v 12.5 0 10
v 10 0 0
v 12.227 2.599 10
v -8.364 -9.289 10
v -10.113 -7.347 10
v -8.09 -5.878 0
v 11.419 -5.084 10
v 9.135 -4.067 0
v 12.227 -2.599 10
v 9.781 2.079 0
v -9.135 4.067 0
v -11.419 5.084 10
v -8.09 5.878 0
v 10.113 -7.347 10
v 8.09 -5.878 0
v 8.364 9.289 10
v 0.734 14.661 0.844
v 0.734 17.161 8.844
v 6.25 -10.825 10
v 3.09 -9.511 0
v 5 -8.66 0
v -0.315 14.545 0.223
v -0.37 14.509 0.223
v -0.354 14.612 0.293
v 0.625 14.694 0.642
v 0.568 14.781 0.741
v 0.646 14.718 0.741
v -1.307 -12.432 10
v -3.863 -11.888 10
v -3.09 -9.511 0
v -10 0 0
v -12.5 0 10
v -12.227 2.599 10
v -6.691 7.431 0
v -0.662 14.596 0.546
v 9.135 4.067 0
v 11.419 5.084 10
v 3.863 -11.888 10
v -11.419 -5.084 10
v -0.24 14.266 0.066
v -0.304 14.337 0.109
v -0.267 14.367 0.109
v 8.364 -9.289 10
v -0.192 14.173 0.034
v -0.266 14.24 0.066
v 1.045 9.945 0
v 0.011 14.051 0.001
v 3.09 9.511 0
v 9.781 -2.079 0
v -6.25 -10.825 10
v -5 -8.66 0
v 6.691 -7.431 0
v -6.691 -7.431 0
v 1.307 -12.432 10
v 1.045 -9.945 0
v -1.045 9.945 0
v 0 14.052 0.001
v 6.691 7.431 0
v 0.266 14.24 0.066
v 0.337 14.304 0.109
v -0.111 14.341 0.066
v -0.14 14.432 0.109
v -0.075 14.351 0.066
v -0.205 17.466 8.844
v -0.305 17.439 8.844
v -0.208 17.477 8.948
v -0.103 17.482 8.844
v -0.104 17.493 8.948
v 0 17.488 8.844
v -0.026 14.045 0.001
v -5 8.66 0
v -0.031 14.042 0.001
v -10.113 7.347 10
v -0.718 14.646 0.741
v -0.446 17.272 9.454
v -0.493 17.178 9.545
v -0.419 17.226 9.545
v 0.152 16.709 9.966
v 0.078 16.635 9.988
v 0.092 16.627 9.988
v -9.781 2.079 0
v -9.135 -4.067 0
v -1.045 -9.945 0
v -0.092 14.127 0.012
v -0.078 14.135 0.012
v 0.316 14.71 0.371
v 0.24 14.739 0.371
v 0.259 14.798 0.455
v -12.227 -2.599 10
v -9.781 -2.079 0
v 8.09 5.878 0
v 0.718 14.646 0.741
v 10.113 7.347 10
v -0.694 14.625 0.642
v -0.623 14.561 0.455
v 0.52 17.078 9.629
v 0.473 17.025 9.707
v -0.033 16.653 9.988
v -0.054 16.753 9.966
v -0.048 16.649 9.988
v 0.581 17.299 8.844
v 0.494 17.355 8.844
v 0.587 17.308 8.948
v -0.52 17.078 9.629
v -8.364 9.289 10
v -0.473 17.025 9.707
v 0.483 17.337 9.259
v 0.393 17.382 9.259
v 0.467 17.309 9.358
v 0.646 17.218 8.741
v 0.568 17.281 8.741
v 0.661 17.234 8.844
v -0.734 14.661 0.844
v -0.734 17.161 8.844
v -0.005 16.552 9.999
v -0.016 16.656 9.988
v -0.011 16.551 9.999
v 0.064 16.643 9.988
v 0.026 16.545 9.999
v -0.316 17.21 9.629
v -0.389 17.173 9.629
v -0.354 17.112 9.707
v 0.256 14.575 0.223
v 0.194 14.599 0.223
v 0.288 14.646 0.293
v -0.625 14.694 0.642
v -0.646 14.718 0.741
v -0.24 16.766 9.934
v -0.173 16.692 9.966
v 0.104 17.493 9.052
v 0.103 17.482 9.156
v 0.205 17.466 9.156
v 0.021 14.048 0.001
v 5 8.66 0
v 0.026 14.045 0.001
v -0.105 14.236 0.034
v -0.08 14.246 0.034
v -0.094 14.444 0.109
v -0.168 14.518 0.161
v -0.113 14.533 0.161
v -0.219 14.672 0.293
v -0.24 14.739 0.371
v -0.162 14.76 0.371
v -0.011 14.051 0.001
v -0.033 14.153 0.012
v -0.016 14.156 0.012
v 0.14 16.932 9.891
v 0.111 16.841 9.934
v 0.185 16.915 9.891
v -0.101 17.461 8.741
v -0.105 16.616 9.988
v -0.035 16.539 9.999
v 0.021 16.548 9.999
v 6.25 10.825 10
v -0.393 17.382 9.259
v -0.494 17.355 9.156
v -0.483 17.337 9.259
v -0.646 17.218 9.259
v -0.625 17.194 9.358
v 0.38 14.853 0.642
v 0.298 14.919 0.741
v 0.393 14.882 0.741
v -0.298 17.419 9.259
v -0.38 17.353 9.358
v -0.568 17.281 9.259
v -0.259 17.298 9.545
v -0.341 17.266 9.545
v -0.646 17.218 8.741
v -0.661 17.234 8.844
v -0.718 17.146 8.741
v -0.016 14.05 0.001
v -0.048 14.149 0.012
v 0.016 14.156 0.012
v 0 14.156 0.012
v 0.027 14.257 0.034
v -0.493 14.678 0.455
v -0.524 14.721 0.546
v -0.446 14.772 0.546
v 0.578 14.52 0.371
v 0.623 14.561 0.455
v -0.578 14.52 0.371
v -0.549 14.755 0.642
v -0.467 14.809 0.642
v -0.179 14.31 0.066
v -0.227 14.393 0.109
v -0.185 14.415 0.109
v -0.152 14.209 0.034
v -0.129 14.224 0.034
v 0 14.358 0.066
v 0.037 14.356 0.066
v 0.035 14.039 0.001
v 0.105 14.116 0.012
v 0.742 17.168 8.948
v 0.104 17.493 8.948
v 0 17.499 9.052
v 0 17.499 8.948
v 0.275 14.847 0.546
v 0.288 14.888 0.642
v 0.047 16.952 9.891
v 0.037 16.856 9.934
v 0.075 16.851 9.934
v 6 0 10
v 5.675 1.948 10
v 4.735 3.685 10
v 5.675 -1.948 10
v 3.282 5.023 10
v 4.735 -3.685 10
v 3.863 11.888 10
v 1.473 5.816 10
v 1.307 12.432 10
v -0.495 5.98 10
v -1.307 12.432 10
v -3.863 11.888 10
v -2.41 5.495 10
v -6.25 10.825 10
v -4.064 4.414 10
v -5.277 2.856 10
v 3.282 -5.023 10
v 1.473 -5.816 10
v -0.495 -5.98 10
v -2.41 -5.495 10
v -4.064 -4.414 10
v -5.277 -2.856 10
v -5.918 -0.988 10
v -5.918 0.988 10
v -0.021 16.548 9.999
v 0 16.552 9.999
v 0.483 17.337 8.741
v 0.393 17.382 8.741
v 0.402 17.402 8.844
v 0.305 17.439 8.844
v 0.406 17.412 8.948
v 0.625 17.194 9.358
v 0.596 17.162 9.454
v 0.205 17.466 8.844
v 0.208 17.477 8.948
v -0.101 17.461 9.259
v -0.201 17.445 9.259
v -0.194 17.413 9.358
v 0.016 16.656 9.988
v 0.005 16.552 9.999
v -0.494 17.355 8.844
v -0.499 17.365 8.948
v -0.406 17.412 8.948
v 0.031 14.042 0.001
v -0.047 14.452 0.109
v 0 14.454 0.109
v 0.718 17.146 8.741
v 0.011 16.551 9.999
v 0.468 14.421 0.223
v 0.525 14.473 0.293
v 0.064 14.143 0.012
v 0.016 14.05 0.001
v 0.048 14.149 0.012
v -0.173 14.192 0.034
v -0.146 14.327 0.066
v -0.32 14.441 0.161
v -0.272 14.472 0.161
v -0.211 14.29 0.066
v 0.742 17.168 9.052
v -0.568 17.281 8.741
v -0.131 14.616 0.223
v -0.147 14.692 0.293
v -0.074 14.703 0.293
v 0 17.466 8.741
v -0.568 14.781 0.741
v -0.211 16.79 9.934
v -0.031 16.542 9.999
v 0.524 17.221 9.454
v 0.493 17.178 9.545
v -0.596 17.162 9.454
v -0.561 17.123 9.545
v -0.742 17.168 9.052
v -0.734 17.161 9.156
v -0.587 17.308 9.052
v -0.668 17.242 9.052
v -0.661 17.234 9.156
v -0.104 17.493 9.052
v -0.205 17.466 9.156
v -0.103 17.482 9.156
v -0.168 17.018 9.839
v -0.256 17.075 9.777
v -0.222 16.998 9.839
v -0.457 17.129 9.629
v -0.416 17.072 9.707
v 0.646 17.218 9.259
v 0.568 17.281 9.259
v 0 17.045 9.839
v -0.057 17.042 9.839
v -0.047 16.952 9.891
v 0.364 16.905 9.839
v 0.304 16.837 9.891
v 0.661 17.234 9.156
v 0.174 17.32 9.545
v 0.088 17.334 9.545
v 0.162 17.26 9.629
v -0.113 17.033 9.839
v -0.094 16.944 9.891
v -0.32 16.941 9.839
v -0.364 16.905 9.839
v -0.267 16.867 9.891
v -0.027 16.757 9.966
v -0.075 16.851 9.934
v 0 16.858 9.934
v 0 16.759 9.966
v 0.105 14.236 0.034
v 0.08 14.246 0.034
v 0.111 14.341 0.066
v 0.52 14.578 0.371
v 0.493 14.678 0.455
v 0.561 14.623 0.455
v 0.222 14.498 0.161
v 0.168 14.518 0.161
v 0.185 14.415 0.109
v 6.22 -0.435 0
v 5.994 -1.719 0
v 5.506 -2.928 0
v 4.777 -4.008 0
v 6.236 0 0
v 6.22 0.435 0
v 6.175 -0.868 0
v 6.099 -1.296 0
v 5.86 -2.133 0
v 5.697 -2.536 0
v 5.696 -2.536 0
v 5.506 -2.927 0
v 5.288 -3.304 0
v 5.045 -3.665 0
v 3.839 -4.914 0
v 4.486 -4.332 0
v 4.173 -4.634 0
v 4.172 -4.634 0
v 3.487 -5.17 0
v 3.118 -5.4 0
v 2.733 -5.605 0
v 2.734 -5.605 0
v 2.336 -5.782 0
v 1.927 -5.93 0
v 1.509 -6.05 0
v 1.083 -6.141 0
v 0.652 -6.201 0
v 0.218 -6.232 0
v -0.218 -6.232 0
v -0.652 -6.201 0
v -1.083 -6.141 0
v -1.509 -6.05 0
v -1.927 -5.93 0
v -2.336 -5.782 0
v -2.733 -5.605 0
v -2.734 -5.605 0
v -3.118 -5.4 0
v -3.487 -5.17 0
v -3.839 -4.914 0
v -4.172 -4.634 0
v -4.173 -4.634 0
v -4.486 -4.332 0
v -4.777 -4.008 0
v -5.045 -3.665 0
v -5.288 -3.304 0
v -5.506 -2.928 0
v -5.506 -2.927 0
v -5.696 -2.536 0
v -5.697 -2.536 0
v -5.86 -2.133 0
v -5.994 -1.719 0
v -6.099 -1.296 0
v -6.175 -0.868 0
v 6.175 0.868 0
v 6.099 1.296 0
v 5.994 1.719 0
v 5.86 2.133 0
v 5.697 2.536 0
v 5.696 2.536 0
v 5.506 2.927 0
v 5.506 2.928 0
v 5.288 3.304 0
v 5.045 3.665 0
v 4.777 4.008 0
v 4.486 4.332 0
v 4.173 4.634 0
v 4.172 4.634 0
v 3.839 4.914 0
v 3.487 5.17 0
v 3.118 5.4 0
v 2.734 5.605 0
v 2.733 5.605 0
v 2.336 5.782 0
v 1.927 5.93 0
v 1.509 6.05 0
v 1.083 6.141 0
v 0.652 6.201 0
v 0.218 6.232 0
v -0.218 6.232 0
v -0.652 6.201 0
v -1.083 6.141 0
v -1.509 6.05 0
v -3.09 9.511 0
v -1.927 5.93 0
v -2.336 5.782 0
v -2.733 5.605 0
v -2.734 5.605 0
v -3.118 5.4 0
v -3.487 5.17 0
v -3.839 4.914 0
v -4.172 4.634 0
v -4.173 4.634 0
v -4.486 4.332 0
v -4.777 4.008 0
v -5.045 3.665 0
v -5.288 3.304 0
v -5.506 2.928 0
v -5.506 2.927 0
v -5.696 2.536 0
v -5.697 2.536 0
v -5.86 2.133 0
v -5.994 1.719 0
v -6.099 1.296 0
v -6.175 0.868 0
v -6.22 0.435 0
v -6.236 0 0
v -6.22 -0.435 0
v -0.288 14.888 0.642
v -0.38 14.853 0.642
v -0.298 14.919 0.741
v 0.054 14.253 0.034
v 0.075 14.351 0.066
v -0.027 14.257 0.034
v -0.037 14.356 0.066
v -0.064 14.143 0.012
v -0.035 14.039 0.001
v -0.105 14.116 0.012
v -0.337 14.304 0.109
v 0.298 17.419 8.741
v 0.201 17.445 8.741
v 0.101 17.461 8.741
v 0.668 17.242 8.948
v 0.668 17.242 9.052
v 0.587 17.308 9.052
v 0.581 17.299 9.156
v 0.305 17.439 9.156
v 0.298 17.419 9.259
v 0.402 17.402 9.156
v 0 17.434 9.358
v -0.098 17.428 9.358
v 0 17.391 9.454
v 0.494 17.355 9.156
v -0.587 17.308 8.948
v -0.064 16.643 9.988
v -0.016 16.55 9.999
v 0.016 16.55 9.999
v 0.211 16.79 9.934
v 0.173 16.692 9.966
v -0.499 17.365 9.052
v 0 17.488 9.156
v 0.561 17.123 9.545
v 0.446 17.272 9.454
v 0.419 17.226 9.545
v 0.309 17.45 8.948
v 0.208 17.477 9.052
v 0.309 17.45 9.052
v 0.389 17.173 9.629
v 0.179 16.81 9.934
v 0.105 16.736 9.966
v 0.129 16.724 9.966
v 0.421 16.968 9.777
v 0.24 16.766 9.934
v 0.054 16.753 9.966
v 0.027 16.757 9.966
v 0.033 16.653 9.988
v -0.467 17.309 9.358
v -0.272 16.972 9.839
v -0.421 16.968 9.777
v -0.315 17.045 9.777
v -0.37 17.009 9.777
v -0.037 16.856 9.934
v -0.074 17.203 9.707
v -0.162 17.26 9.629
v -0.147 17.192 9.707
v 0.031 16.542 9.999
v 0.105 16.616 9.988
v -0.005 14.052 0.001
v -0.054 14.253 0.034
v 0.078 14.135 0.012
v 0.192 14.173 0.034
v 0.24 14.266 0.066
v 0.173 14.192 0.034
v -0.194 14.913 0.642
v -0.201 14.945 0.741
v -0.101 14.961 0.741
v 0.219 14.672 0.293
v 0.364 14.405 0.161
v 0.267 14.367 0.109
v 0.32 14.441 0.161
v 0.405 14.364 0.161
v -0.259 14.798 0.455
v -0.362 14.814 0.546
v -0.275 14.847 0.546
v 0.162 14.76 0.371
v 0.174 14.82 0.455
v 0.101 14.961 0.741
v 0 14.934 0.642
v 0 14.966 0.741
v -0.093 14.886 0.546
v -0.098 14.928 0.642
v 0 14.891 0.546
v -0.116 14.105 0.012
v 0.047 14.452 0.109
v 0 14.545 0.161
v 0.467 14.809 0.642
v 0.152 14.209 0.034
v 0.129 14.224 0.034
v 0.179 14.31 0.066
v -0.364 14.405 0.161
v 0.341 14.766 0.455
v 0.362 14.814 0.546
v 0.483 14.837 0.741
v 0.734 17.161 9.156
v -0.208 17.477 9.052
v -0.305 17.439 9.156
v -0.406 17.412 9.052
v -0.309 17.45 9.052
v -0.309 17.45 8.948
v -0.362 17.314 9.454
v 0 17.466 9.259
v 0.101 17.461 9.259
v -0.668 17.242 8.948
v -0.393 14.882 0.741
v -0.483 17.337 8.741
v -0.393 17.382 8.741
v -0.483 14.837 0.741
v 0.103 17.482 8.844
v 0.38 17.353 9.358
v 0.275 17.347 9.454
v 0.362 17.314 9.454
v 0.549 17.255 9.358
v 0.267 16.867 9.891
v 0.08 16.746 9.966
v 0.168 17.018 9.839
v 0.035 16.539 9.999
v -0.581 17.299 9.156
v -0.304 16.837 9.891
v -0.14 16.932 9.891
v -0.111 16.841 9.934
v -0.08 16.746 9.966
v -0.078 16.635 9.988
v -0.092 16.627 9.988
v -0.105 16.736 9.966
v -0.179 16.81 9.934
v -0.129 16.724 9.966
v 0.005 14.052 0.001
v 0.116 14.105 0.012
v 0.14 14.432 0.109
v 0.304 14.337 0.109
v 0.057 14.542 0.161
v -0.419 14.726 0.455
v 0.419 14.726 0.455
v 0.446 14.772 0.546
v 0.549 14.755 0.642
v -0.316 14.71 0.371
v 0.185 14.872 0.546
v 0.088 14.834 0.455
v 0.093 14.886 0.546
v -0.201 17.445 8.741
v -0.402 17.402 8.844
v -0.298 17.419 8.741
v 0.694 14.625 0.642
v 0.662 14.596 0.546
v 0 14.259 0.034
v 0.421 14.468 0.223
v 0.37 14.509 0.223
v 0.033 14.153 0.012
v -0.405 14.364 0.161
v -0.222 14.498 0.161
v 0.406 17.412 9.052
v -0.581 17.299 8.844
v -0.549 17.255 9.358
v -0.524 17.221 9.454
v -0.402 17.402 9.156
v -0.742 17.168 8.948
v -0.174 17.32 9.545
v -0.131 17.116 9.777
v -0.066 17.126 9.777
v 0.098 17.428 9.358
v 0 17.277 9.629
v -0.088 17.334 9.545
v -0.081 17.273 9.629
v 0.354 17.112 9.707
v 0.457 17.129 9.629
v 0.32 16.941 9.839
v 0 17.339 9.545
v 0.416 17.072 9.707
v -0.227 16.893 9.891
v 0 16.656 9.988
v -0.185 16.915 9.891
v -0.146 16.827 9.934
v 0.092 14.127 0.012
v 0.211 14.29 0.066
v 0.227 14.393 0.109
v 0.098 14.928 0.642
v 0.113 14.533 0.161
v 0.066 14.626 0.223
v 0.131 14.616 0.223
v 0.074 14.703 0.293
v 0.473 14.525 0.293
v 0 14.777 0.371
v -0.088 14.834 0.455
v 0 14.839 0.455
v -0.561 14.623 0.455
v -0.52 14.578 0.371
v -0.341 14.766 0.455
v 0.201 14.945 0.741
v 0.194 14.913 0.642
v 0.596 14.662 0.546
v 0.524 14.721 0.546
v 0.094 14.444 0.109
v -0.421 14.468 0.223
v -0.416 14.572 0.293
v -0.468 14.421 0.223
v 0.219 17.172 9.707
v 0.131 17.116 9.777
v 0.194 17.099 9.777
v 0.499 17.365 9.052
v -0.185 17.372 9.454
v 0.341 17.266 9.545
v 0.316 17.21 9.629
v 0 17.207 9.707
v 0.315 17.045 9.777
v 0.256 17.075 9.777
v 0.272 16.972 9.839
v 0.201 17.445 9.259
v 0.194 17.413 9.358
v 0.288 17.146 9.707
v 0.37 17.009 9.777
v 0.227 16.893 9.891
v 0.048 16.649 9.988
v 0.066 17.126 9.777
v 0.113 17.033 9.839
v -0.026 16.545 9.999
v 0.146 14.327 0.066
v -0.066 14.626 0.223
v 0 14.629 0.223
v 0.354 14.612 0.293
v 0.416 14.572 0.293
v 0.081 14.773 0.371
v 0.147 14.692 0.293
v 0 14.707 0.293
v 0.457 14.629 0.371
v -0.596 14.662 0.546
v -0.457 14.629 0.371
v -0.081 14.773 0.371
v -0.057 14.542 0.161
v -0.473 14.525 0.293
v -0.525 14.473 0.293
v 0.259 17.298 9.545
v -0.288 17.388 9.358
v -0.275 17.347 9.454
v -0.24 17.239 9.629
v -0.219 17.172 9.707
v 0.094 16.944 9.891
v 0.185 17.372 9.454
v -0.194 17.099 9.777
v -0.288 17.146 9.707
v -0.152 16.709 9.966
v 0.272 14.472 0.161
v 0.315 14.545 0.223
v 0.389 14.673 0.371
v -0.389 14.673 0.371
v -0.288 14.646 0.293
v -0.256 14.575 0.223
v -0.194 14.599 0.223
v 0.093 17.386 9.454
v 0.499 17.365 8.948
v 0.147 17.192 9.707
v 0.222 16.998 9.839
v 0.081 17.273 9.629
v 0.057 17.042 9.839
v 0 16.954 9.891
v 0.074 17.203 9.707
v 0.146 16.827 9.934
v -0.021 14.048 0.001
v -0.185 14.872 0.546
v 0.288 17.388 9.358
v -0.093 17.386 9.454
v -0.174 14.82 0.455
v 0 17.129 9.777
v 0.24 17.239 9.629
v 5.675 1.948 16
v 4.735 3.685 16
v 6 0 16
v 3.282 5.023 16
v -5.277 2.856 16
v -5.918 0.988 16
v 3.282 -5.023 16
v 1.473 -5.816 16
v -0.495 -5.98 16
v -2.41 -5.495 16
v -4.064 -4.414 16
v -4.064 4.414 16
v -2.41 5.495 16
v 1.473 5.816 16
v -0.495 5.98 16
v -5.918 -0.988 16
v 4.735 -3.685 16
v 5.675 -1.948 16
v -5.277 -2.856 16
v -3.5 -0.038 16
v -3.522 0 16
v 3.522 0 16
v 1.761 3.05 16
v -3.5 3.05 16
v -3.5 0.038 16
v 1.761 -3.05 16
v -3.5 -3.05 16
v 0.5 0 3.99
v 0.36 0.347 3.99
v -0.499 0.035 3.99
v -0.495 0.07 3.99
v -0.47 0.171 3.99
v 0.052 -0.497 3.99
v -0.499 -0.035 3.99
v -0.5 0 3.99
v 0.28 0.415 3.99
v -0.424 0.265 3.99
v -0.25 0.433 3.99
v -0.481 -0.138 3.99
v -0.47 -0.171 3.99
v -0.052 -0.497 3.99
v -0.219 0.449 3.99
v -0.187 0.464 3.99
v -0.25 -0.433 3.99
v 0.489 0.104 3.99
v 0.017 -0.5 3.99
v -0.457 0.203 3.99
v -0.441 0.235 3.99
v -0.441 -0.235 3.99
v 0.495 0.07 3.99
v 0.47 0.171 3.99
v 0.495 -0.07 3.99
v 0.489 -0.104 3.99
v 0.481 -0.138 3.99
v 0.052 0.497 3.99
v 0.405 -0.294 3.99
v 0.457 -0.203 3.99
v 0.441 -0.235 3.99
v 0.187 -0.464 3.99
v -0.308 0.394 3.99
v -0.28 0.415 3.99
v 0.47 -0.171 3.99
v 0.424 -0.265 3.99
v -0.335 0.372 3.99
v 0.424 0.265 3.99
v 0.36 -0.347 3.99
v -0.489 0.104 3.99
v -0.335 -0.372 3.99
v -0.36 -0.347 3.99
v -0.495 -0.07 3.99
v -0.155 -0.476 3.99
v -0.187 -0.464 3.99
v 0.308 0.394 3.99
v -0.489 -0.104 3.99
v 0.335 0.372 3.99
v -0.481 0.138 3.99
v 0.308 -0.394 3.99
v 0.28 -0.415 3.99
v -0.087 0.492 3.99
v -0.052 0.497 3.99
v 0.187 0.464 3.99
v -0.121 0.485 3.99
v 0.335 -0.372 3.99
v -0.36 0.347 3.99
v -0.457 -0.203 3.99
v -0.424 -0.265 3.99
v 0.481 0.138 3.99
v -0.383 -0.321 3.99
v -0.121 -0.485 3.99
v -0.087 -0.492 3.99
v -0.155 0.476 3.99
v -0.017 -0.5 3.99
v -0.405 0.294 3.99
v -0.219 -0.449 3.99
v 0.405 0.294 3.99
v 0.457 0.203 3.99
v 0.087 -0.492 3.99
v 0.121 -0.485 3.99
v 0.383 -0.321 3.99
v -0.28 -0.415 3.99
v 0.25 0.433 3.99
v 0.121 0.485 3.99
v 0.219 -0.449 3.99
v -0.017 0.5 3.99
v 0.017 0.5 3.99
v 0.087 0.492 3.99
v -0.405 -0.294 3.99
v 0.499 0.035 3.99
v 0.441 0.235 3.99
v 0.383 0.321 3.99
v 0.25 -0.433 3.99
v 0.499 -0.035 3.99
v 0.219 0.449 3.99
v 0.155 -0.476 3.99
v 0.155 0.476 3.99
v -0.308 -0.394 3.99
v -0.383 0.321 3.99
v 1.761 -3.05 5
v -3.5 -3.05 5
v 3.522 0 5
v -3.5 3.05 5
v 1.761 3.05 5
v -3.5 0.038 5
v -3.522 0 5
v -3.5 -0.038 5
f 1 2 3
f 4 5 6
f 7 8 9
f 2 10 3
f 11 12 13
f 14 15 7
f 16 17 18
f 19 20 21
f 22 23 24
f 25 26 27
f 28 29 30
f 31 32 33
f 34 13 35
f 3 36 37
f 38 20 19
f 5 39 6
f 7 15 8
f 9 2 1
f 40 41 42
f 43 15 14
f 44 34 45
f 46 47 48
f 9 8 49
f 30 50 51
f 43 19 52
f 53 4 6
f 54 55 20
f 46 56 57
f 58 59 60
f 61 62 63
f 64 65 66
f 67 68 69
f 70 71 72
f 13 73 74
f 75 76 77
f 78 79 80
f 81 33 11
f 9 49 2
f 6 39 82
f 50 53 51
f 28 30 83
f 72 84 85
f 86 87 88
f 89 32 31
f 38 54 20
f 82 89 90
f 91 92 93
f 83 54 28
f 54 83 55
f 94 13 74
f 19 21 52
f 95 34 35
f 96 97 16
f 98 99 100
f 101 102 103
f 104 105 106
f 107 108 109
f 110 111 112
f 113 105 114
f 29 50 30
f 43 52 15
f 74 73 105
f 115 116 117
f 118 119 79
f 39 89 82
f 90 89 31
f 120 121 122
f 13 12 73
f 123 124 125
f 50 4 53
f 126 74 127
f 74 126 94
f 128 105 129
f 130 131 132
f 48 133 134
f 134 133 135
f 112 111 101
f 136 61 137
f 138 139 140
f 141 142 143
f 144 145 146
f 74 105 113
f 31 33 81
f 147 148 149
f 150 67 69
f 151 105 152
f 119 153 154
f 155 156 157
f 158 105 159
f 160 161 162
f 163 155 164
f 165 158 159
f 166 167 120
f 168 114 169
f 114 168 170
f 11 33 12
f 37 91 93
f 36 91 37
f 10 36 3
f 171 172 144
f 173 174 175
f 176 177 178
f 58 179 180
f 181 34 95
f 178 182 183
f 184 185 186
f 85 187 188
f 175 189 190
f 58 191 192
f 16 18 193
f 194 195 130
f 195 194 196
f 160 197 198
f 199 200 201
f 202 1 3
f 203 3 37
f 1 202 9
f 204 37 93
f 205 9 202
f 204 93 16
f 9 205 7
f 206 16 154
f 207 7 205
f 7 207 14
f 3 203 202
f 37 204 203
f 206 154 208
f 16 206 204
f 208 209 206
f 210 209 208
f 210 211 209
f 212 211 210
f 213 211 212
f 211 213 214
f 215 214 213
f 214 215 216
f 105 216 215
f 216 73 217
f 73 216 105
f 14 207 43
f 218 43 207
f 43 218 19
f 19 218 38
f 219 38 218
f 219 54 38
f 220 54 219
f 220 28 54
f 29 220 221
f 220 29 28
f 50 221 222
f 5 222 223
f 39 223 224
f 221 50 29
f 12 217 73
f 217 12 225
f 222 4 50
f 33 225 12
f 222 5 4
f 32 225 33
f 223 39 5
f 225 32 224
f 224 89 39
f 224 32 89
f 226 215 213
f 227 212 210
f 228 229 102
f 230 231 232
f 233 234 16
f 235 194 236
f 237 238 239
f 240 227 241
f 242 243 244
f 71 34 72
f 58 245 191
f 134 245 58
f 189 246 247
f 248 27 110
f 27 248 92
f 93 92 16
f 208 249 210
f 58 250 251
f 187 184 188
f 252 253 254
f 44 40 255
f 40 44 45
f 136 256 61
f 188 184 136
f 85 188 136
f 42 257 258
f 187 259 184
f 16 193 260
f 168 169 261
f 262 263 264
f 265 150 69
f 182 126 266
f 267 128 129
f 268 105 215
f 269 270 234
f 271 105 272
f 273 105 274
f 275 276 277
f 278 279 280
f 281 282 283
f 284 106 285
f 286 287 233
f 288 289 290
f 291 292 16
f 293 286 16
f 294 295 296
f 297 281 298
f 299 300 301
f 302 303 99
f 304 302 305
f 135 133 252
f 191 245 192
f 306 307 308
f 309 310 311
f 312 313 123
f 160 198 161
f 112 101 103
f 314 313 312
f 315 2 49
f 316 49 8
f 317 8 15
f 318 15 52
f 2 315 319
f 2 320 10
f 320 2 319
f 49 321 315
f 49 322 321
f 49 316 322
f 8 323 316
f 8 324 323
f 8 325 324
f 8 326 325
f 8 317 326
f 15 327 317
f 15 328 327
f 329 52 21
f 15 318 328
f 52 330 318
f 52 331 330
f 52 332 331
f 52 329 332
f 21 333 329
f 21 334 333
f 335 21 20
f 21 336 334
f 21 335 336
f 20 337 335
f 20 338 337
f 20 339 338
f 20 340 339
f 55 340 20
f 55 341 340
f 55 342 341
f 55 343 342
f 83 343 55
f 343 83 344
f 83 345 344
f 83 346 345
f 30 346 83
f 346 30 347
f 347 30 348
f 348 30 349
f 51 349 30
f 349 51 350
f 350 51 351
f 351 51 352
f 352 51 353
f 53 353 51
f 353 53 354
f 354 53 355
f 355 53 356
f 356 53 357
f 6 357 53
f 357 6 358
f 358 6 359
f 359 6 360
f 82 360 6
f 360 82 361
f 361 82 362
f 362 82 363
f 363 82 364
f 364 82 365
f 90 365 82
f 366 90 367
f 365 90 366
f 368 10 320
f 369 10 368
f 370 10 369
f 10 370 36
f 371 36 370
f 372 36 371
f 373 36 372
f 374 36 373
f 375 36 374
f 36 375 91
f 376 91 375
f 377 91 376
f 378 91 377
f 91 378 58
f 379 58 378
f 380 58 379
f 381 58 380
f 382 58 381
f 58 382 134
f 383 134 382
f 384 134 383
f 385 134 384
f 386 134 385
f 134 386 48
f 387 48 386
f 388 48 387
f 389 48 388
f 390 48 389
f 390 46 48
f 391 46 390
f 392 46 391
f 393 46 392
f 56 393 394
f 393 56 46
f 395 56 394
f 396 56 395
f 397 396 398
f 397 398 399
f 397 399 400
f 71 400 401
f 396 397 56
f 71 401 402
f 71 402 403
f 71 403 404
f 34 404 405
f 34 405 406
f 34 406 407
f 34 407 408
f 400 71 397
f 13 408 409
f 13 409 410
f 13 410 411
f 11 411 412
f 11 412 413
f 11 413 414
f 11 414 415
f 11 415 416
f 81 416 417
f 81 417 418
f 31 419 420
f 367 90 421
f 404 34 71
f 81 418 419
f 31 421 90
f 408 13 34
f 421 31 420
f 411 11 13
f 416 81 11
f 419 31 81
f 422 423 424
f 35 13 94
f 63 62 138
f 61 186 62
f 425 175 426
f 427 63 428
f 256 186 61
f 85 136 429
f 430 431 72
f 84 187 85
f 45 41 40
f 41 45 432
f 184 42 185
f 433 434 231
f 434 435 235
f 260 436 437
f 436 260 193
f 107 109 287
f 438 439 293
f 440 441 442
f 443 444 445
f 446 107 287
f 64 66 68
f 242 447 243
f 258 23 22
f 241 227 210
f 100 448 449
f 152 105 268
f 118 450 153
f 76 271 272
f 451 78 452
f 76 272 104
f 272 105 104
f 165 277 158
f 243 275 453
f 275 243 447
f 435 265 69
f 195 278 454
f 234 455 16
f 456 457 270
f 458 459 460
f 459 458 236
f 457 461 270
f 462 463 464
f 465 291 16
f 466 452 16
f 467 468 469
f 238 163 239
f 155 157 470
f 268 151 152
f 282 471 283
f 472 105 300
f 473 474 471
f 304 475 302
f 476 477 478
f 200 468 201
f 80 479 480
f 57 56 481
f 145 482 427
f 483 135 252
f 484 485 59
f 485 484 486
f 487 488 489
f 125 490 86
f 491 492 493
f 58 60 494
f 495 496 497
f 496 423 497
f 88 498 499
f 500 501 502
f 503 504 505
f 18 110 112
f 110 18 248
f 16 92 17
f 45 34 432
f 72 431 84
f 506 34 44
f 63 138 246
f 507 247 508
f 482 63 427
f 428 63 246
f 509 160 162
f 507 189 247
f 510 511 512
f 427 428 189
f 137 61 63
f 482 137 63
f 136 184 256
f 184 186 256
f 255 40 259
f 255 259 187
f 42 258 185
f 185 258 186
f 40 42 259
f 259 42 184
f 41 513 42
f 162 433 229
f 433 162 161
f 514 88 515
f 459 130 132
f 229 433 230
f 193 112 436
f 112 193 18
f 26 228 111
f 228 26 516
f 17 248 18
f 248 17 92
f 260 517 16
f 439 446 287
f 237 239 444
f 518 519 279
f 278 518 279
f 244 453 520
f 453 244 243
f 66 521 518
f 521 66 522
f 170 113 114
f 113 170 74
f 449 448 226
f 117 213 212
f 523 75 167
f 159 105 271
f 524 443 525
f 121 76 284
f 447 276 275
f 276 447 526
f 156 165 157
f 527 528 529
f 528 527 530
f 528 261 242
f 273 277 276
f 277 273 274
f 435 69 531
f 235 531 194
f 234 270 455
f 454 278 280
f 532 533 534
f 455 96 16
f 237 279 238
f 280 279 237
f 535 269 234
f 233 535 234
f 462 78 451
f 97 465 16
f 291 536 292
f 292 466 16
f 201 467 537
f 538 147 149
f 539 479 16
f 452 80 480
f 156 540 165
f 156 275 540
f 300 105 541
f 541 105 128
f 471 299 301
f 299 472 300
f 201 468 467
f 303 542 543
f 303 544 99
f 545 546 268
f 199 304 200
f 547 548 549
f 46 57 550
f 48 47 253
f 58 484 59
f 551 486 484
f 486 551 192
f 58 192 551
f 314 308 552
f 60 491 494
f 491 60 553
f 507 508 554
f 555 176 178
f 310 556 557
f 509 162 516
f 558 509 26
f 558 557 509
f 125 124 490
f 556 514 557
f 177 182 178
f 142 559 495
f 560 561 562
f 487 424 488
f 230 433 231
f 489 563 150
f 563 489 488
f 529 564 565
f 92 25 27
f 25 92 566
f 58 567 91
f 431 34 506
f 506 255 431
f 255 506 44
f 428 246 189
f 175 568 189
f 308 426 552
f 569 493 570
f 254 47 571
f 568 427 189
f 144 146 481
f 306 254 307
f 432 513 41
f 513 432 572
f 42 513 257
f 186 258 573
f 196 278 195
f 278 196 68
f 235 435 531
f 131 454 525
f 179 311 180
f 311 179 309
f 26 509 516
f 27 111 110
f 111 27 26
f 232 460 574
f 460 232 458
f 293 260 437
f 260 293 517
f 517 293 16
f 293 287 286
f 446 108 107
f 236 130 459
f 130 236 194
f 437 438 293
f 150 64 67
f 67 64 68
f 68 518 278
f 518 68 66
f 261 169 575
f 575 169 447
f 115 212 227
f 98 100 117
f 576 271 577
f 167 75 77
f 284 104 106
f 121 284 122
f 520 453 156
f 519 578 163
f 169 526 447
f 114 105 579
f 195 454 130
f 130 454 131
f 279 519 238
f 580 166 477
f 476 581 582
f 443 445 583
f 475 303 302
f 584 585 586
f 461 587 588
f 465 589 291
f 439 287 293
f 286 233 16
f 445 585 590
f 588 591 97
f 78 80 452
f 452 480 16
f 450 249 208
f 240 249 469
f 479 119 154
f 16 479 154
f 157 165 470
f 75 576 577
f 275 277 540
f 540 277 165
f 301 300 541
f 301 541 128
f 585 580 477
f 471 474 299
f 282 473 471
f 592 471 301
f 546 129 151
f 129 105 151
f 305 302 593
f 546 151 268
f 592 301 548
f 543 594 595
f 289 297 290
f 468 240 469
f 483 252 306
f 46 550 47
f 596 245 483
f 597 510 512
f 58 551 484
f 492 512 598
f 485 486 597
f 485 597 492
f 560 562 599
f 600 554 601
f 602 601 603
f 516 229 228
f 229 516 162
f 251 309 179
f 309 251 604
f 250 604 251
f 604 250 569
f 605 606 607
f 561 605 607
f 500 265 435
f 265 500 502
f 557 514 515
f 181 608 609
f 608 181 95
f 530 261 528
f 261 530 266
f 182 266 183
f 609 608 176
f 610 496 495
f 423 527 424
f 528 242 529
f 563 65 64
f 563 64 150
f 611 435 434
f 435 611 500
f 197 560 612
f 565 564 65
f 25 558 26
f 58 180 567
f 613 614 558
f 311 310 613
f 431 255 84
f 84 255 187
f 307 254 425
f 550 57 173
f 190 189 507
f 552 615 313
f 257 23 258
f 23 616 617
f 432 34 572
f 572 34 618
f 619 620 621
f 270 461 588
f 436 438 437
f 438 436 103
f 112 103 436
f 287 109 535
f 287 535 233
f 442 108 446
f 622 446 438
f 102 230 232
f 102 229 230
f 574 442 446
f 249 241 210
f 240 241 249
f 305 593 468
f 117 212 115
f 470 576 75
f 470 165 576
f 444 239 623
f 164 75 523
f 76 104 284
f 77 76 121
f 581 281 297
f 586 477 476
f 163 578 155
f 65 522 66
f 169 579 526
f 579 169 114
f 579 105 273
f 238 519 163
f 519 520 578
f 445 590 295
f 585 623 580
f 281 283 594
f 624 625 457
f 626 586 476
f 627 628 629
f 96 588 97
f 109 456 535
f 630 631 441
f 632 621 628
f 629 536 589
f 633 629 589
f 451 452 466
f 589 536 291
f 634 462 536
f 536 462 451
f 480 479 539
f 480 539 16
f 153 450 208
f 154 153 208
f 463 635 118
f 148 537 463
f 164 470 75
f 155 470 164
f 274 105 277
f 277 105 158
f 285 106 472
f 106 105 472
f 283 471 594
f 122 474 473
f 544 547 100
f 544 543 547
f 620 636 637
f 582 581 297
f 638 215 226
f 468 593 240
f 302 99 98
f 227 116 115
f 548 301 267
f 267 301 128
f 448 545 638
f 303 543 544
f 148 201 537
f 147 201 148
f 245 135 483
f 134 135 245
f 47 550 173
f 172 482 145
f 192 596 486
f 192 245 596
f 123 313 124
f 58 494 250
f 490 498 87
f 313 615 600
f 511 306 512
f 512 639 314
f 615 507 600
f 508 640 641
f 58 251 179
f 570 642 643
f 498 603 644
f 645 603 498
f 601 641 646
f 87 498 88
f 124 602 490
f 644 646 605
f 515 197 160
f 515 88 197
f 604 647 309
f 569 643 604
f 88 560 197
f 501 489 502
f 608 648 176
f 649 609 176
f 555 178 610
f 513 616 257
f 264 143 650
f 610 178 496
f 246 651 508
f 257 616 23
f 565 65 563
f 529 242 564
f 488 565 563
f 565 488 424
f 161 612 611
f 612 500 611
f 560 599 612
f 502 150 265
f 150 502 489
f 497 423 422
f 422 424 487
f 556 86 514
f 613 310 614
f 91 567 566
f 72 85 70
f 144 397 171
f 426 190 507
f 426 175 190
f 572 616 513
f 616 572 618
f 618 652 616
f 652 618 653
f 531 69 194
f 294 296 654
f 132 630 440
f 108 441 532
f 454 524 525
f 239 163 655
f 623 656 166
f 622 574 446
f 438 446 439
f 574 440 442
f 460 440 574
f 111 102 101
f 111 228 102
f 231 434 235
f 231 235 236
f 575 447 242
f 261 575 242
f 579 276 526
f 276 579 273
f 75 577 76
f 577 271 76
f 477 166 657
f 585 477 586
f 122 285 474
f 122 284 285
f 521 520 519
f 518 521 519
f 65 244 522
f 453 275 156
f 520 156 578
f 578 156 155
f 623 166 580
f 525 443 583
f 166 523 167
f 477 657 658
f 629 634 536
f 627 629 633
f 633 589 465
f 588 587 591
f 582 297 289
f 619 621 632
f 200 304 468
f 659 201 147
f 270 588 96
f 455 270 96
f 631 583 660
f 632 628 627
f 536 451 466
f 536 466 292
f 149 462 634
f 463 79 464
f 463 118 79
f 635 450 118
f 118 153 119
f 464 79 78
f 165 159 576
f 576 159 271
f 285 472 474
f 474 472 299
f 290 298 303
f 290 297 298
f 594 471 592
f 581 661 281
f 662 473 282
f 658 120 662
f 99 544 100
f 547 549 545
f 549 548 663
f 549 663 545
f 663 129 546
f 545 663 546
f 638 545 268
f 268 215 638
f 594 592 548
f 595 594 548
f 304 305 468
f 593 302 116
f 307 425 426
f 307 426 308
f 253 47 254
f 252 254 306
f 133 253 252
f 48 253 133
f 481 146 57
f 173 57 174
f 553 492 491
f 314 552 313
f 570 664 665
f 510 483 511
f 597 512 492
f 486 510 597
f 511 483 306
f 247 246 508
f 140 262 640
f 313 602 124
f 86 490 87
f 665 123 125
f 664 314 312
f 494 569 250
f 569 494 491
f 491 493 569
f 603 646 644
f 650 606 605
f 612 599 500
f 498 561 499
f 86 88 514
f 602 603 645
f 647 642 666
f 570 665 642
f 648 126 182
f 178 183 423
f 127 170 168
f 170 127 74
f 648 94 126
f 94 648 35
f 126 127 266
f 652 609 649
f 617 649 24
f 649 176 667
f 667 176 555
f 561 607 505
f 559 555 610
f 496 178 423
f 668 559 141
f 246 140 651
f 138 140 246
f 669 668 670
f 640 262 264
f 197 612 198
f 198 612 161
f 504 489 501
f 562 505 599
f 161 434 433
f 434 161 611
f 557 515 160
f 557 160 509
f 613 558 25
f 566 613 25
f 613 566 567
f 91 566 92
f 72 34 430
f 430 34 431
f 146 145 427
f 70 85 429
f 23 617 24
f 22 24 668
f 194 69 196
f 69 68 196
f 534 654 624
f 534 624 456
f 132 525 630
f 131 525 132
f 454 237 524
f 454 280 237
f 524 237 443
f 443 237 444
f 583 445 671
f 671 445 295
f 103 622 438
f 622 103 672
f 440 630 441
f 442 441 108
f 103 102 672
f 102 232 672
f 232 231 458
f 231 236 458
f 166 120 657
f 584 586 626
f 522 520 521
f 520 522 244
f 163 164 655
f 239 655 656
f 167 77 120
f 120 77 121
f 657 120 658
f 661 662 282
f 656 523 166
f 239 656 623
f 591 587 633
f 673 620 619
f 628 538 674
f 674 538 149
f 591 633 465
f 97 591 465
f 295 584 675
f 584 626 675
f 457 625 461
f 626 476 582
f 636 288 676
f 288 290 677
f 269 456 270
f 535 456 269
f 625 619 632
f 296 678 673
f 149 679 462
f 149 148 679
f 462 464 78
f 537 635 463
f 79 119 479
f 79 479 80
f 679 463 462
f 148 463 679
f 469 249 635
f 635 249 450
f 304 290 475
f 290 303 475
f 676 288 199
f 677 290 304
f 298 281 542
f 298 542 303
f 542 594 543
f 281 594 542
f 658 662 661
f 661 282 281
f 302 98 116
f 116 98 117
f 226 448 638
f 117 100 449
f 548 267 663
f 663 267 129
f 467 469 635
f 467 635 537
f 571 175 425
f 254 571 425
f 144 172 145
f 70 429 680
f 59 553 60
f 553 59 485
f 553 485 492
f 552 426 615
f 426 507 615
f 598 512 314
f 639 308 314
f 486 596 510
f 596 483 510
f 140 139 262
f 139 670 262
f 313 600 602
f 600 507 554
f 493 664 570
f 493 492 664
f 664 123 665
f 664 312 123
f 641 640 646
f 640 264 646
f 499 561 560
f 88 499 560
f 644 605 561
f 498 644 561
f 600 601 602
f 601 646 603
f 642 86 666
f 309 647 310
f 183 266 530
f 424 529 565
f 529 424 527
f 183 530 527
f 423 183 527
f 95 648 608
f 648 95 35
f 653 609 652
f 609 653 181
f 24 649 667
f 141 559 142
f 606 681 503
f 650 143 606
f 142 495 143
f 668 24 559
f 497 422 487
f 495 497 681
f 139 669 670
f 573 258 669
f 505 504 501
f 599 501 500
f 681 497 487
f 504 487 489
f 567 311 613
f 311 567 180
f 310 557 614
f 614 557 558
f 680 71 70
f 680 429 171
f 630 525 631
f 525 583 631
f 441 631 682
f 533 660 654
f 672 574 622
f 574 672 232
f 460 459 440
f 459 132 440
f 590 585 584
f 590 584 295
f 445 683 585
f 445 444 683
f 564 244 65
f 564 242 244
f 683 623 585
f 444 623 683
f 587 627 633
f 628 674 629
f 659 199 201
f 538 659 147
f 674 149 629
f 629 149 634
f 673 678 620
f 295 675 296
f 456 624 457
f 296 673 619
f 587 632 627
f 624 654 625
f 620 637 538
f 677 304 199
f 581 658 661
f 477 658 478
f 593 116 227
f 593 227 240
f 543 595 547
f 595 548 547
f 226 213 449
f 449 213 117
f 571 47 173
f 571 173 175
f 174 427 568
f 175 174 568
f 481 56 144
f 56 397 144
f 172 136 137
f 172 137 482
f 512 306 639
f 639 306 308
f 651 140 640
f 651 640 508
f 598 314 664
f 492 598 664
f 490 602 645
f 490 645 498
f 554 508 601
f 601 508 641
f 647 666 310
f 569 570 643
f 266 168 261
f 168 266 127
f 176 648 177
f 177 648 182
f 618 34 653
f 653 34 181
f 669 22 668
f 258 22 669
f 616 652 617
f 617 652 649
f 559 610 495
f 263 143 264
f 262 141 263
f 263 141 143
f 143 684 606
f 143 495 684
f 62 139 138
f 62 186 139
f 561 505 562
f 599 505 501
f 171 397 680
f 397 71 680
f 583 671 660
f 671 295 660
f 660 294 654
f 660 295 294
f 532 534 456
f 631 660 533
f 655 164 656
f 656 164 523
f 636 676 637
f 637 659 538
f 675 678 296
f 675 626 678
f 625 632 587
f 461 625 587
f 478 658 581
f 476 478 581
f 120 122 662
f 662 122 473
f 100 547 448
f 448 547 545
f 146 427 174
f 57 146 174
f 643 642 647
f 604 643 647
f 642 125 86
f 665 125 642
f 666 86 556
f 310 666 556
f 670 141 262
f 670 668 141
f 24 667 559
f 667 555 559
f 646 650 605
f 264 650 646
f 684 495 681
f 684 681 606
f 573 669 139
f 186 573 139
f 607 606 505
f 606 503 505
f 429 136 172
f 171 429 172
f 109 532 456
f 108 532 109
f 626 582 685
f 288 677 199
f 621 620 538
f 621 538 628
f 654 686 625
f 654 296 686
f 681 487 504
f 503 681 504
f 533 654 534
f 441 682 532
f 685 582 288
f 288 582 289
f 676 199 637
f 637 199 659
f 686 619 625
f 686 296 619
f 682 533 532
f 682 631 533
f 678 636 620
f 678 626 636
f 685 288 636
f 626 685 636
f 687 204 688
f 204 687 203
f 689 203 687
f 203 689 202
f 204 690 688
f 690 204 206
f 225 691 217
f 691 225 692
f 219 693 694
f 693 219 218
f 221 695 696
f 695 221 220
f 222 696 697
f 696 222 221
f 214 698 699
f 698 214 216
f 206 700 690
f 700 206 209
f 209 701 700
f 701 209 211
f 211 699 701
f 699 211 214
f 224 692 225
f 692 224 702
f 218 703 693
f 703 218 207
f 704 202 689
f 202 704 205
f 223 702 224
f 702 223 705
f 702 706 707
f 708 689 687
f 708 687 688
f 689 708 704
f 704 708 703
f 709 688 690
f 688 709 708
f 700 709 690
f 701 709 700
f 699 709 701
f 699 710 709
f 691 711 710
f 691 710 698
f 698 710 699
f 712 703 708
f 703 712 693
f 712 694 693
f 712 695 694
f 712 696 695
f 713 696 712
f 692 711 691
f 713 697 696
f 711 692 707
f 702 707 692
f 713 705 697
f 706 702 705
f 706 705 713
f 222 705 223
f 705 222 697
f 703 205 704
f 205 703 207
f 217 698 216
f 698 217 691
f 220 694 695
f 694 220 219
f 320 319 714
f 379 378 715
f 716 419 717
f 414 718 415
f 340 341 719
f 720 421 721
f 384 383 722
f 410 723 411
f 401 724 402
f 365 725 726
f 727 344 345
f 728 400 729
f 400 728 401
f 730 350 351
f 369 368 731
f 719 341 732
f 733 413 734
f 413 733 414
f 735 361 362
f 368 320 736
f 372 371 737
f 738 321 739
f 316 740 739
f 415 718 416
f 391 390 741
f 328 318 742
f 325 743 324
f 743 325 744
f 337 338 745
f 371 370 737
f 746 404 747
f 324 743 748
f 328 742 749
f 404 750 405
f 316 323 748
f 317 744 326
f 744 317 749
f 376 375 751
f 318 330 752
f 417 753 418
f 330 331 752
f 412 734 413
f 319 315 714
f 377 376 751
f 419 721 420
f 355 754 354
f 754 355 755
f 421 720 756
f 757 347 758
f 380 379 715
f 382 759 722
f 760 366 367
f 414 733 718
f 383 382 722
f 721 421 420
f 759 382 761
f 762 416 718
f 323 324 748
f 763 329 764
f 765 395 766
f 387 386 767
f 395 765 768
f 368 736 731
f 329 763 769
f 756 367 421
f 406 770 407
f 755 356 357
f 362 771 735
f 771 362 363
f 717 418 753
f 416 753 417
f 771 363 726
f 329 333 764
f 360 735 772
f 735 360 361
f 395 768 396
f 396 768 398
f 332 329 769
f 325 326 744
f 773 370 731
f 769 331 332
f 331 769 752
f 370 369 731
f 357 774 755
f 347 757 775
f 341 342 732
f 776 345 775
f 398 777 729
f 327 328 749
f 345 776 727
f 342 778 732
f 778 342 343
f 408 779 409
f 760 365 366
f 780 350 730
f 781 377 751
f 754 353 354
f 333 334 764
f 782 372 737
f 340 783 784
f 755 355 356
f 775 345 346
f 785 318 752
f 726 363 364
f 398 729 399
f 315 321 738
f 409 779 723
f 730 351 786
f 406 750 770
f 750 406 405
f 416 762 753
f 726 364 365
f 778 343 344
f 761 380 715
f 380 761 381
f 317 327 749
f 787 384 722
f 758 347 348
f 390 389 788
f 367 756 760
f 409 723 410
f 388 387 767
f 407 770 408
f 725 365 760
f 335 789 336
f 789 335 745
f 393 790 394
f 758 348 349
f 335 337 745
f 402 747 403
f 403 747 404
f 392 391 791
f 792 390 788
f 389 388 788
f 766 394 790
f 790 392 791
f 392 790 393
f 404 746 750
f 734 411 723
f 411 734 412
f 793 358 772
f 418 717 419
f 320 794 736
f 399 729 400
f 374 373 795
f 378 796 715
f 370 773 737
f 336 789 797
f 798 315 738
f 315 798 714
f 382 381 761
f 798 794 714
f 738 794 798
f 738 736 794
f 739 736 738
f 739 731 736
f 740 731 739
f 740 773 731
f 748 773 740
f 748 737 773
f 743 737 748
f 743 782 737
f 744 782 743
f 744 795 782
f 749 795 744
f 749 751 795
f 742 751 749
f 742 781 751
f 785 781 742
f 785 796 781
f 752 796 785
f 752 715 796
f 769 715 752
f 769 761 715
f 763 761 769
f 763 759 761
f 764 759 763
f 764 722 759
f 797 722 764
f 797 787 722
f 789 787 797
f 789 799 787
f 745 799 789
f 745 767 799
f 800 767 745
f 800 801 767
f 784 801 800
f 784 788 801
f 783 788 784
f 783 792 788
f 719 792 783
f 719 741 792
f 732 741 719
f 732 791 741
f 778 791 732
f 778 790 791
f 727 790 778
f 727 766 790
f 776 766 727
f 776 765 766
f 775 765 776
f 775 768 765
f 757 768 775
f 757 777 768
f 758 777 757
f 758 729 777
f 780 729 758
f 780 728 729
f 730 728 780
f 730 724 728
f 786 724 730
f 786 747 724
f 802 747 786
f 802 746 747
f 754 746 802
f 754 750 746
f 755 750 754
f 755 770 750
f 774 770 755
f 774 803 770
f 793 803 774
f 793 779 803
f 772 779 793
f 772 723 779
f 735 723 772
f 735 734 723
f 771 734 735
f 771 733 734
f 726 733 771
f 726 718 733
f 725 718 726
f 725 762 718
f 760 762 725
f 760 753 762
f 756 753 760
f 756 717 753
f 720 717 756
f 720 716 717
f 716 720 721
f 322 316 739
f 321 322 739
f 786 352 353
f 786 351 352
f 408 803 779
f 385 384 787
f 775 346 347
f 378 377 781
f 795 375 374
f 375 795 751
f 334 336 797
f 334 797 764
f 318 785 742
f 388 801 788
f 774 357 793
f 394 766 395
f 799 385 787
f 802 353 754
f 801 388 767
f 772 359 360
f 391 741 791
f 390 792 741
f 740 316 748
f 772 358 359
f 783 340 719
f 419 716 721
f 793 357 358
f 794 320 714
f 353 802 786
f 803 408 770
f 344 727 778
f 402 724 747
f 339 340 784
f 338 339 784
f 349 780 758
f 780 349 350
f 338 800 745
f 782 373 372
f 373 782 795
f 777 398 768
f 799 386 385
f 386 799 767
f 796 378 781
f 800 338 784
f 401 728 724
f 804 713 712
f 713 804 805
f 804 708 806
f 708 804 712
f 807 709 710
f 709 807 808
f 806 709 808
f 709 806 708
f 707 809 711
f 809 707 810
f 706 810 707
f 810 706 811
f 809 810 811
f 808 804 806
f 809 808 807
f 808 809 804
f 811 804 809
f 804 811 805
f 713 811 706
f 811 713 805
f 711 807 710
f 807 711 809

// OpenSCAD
// Copyright 2023 Heikki Suonsivu
// Licensed under Creative Commons CC-BY-NC-SA, see https://creativecommons.org/licenses/by-nc-sa/4.0/
// For commercial licensing, please contact directly, hsu-3d@suonsivu.net, +358 40 551 9679

baseheight=7;
basexoffset=baseheight/2;
basewidth=6.1;

basediameter=12;
knobdiameter=25;
knobnarrowing=5;
diald=2;
diallength=knobdiameter/2*1.4-diald/2; // from center
knobh=10;
knobbaseh=6;
knobholedepth=11;
knobholez=knobbaseh+knobh-knobholedepth;

difference() {
  union() {
    hull() {
      cylinder(h=knobh,d1=knobdiameter-knobnarrowing,d2=knobdiameter);
      translate([0,diallength,knobh-diald/2]) sphere(d=diald,$fn=60);
      translate([0,diallength-knobnarrowing/2,diald/2]) sphere(d=diald,$fn=60);
    }
    translate([0,0,knobh]) cylinder(d=basediameter,h=knobbaseh);
  }
  translate([0,0,-0.01]) cylinder(h=knobholez-1,d1=knobdiameter*.5,d2=1,$fn=90);

  translate([0,0,knobholez]) cylinder(h=knobholedepth+0.01,d=basewidth/cos(180/6),$fn=6);
  translate([-basexoffset,-basewidth/2,knobholez]) cube([basewidth/2,basewidth,knobholedepth+0.01]);

}
